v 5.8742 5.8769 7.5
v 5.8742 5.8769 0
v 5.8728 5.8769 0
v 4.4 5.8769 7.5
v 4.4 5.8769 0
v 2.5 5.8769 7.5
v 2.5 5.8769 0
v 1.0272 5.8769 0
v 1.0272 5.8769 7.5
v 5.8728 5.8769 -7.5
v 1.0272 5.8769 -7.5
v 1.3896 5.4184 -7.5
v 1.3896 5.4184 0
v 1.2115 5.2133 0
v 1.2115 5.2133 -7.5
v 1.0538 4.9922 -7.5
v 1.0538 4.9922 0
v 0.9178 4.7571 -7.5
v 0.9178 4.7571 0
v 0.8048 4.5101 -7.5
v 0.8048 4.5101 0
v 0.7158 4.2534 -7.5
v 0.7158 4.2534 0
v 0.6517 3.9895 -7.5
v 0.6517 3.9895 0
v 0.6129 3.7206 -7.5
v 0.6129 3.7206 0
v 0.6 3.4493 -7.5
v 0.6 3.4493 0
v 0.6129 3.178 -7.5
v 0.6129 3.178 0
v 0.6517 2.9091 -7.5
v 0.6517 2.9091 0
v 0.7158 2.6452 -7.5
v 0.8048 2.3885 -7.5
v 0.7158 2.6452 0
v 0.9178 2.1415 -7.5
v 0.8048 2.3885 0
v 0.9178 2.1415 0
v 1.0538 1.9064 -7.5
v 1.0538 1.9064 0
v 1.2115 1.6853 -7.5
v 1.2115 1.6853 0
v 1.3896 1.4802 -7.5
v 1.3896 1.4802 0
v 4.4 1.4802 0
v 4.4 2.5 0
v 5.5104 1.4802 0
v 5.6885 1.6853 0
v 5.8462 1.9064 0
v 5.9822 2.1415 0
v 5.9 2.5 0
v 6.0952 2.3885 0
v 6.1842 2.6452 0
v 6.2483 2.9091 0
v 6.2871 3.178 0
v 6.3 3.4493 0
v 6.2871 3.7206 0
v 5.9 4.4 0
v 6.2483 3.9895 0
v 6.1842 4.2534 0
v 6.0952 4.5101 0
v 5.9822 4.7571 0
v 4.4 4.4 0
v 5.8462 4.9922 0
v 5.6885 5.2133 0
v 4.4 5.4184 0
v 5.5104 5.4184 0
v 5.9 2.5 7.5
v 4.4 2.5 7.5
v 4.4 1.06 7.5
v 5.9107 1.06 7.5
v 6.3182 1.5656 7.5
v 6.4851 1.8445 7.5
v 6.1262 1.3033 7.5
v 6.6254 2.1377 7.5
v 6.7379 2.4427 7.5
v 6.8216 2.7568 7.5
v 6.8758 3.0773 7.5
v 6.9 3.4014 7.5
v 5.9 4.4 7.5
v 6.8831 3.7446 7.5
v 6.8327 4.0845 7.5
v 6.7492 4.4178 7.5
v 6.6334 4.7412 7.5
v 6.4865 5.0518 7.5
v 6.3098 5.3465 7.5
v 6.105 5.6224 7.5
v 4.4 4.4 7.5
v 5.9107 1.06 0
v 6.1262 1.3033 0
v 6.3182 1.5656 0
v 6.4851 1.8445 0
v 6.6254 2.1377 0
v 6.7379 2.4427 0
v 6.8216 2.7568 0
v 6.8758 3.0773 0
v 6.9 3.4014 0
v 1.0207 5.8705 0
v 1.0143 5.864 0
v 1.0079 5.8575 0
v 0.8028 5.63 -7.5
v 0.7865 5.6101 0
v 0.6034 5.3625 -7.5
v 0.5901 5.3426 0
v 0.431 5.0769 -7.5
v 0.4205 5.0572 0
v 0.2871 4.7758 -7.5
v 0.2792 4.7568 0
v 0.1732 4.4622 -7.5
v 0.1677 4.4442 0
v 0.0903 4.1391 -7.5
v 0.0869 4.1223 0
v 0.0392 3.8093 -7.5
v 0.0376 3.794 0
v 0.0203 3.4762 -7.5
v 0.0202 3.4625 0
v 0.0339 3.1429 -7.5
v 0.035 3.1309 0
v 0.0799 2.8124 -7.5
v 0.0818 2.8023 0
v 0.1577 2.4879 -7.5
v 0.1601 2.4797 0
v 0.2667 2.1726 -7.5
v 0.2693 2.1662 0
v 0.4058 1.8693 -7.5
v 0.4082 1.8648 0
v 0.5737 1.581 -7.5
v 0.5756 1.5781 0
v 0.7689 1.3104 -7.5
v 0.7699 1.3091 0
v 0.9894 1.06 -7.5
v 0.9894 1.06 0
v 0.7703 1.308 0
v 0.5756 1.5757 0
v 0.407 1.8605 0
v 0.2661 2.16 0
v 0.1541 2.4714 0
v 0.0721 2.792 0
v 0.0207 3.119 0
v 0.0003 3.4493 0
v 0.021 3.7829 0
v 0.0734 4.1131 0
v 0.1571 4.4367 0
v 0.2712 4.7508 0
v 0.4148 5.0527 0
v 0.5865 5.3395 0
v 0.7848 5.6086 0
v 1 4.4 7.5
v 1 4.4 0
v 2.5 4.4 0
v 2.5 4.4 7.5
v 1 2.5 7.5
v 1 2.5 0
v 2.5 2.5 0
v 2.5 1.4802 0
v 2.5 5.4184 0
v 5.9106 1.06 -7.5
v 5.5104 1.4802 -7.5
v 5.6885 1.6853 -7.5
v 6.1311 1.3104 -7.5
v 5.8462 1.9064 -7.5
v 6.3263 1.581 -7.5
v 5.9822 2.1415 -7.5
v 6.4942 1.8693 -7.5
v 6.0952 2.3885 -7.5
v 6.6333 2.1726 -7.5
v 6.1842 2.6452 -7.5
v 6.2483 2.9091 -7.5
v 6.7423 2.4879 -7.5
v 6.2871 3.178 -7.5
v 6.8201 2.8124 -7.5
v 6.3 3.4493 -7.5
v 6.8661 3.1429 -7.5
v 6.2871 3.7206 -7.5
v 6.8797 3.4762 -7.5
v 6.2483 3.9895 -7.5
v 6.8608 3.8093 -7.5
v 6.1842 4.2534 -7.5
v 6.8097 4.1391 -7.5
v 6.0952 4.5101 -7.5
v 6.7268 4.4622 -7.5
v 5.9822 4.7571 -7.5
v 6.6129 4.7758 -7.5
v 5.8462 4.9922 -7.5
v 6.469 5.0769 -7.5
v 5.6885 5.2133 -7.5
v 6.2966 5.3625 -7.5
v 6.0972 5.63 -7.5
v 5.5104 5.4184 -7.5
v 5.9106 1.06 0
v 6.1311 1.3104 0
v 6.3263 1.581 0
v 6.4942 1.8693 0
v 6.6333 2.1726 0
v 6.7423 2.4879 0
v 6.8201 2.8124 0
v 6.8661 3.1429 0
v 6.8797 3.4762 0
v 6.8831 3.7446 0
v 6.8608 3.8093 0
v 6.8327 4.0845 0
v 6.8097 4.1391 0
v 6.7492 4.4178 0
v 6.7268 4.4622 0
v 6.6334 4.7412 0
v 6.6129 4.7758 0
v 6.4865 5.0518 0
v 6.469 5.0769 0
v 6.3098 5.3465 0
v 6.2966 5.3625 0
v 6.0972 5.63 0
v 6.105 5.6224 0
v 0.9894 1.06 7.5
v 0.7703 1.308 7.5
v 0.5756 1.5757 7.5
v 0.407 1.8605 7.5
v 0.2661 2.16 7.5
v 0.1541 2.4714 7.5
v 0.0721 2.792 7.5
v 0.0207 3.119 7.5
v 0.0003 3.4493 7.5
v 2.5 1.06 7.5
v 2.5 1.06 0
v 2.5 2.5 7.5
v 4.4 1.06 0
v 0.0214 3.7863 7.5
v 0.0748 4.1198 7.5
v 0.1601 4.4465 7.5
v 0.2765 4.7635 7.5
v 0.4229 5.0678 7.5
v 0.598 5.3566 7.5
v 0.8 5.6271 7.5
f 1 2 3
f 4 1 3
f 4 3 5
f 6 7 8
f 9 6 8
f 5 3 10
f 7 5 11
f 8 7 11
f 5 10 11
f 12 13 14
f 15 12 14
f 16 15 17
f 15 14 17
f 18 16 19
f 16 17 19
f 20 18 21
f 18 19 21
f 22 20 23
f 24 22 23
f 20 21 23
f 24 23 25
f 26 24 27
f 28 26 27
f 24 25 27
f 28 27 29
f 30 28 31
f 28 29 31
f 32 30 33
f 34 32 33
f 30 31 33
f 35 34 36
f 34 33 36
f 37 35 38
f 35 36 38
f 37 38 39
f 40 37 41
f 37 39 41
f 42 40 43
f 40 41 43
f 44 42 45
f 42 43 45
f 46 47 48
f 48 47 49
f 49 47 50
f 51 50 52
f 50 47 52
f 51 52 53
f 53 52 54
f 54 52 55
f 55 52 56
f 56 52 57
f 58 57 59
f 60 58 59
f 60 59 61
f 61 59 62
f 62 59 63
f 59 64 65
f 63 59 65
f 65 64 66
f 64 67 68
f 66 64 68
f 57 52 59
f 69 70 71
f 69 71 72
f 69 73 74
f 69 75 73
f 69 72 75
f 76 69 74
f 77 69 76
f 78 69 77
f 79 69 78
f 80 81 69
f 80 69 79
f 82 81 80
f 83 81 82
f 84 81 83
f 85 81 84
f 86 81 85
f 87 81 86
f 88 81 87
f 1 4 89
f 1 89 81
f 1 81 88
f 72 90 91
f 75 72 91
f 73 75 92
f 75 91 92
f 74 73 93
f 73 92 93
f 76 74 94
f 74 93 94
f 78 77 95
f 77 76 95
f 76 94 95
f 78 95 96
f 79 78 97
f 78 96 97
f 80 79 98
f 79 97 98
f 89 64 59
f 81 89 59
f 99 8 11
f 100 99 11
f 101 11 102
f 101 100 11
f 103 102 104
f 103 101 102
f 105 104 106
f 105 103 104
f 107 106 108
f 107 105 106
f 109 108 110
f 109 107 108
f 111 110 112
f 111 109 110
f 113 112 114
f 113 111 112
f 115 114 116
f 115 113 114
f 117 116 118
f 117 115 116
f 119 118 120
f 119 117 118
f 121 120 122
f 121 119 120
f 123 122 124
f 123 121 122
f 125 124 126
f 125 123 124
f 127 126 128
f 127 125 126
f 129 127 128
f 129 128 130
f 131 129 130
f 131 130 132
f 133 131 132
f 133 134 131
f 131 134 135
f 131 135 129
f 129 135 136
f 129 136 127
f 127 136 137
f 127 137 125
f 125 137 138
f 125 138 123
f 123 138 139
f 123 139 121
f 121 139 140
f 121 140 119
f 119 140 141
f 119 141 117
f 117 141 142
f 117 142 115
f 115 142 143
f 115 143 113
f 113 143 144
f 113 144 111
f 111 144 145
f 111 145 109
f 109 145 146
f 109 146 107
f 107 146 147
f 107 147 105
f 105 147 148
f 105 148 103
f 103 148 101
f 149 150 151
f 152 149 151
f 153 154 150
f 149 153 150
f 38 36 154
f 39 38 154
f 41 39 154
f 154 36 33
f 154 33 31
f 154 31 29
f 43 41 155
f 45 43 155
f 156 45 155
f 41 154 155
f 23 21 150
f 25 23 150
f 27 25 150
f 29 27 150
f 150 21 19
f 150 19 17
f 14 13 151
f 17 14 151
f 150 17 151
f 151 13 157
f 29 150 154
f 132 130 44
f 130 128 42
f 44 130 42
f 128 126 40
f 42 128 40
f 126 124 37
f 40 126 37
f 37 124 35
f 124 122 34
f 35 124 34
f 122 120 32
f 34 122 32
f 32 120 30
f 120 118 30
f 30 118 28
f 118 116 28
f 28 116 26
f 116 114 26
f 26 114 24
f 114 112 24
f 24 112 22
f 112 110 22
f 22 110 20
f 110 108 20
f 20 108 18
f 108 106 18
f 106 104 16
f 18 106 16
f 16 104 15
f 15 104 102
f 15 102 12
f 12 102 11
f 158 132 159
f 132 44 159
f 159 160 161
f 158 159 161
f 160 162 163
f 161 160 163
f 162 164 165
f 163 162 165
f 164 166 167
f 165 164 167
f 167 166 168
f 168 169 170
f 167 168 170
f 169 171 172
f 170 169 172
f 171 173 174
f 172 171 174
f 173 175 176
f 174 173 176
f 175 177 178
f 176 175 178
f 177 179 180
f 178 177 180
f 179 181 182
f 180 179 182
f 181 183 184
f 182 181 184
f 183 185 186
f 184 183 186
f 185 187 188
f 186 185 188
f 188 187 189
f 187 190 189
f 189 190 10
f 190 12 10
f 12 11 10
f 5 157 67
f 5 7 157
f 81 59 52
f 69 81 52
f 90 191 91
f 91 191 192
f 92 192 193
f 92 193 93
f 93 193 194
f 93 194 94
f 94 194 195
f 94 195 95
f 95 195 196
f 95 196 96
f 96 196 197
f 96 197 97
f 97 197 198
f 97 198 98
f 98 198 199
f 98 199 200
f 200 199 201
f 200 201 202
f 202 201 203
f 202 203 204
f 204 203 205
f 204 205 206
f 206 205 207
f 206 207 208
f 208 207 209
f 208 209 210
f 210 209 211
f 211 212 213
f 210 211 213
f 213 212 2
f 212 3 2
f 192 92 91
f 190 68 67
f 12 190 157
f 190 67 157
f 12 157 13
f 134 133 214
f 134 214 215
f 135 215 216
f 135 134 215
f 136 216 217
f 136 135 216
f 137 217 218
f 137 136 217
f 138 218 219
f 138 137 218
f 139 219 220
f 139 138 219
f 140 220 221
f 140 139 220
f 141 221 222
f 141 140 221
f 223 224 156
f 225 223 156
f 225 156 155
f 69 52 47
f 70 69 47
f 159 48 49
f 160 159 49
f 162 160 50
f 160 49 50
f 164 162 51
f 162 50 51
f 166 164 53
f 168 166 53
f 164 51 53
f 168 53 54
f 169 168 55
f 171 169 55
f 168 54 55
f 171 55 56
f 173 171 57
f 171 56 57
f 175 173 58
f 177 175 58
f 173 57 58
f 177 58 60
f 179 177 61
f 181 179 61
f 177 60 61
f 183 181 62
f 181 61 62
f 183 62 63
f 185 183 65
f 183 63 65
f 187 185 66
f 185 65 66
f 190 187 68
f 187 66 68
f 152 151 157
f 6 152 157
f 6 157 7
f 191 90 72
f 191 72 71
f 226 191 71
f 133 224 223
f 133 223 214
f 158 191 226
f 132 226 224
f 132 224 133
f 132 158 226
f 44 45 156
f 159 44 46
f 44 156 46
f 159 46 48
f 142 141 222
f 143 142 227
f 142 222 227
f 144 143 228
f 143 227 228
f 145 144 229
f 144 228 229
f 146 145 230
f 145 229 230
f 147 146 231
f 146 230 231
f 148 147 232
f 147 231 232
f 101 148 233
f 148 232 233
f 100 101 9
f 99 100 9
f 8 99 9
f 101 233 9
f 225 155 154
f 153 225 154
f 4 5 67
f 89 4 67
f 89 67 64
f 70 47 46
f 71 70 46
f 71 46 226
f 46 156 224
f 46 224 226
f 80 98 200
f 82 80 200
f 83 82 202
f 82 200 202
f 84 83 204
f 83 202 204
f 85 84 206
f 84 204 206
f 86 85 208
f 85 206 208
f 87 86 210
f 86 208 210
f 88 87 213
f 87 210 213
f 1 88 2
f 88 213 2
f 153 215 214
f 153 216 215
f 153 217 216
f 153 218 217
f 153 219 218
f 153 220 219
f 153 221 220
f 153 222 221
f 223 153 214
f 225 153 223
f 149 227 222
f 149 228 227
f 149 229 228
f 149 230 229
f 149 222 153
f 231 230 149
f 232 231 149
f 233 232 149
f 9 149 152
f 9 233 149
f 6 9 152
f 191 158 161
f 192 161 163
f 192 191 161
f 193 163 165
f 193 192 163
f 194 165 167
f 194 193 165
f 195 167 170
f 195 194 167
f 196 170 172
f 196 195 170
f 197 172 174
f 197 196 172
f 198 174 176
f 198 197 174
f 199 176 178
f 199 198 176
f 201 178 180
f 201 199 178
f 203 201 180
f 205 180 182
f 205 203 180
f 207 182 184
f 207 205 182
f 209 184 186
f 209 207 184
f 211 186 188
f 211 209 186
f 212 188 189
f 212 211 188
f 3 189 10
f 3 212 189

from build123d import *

# Parameters (mm, degrees)
SKETCH1_W           = 6.9
SKETCH1_H           = 6.9
BOSS_EXTRUDE1_DEPTH = 7.5
FILLET2_R           = 3.5
FILLET3_R           = 3.5
FILLET4_R           = 3.5
FILLET5_DEPTH       = 7.5
SKETCH2_R           = 3.429778851
BOSS_EXTRUDE3_DEPTH = 7.5
SKETCH4_W           = 6.879778851
SKETCH4_H           = 1.06
CUT_EXTRUDE6_DEPTH  = 15
CUT_EXTRUDE8_DEPTH  = 15


with BuildPart() as part:
    # Sketch1 → Boss-Extrude1 (new body)
    with BuildSketch(Plane.XY):
        with Locations((3.45, 3.45)):
            Rectangle(SKETCH1_W, SKETCH1_H)
        Polygon((3.45, 5.9), (4.4, 5.9), (4.4, 4.4), (5.9, 4.4), (5.9, 2.5), (4.4, 2.5), (4.4, 1), (2.5, 1), (2.5, 2.5), (1, 2.5), (1, 4.4), (2.5, 4.4), (2.5, 5.9), align=None, mode=Mode.SUBTRACT)
    extrude(amount=BOSS_EXTRUDE1_DEPTH)

    # Fillet2
    fillet2_edges = [part.edges().sort_by_distance(p)[0] for p in [
        (0, 6.9, 3.75),
    ]]
    fillet(fillet2_edges, radius=FILLET2_R)

    # Fillet3
    # the kernel refuses this fillet: 3.5 mm, written as the material it takes off along each edge
    with BuildSketch(Plane(origin=(6.9, 6.9, -8.746427842), x_dir=(-1, 0, 0), z_dir=(0, 0, 1))) as fillet3_piece_1:
        with BuildLine():
            CenterArc((3.5, 3.498571137), FILLET3_R, 180, 88.362754922)
            Line((0, 3.498571137), (-0.07, 3.498571137))
            Line((-0.07, 3.498571137), (-0.07, 0))
            Line((-0.07, 0), (0, -0.07))
            ThreePointArc((0, -0.07), (1.7, -0.07), (3.398, -0.069971423))
            Line((3.398, -0.069971423), (3.4, 0))
        make_face()
    extrude(amount=24.992855685, mode=Mode.SUBTRACT)

    # Fillet4
    # the kernel refuses this fillet: 3.5 mm, written as the material it takes off along each edge
    with BuildSketch(Plane(origin=(6.9, 0, -8.746529216), x_dir=(0, 1, 0), z_dir=(0, 0, 1))) as fillet4_piece_1:
        with BuildLine():
            CenterArc((3.5, 3.498611686), FILLET4_R, 180, 88.386155146)
            Line((0, 3.498611686), (-0.07, 3.498611686))
            Line((-0.07, 3.498611686), (-0.07, 0))
            Line((-0.07, 0), (0, -0.07))
            ThreePointArc((0, -0.07), (1.700714432, -0.07), (3.39945744, -0.069972234))
            Line((3.39945744, -0.069972234), (3.401428863, 0))
        make_face()
    extrude(amount=24.993058431, mode=Mode.SUBTRACT)

    # Fillet5: read off the stored shape, not the designer's step
    # Fillet5 outline → Fillet5 (cut)
    with BuildSketch(Plane.XY):
        with BuildLine():
            Line((0, 0), (3.401388314, 0))
            ThreePointArc((3.401388314, 0), (1.007751346, 1.041234576), (0.000347304, 3.449305272))
            ThreePointArc((0.000347304, 3.449305272), (8.6827e-05, 3.424653248), (0, 3.4))
            Line((0, 3.4), (0, 0))
        make_face()
    extrude(amount=FILLET5_DEPTH, mode=Mode.SUBTRACT)

    # Sketch2 → Boss-Extrude3 (add)
    with BuildSketch(Plane.XY):
        with Locations((3.45, 3.449305272)):
            Circle(SKETCH2_R)
        with BuildLine():
            Line((5.5103837, 5.418396181), (1.3896163, 5.418396181))
            ThreePointArc((1.3896163, 5.418396181), (0.6, 3.449305272), (1.3896163, 1.480214363))
            Line((1.3896163, 1.480214363), (5.5103837, 1.480214363))
            ThreePointArc((5.5103837, 1.480214363), (6.3, 3.449305272), (5.5103837, 5.418396181))
        make_face(mode=Mode.SUBTRACT)
    extrude(amount=-BOSS_EXTRUDE3_DEPTH)

    # Sketch4 → Cut-Extrude6 (cut)
    with BuildSketch(Plane(origin=(0, 0, -7.5), x_dir=(-1, 0, 0), z_dir=(0, 0, -1))):
        with Locations((-3.439889426, 0.53)):
            Rectangle(SKETCH4_W, SKETCH4_H)
    extrude(amount=-CUT_EXTRUDE6_DEPTH, mode=Mode.SUBTRACT)

    # Sketch6 → Cut-Extrude8 (cut)
    with BuildSketch(Plane(origin=(0, 0, -7.5), x_dir=(-1, 0, 0), z_dir=(0, 0, -1))):
        Polygon((-3.455260778, 6.975766387), (-6.044608069, 6.975766387), (-6.044608069, 5.876947105), (-3.455260778, 5.876947105), (-1.008353024, 5.876947105), (-1.008353024, 6.975766387), align=None)
    extrude(amount=-CUT_EXTRUDE8_DEPTH, mode=Mode.SUBTRACT)


solid = part.part
